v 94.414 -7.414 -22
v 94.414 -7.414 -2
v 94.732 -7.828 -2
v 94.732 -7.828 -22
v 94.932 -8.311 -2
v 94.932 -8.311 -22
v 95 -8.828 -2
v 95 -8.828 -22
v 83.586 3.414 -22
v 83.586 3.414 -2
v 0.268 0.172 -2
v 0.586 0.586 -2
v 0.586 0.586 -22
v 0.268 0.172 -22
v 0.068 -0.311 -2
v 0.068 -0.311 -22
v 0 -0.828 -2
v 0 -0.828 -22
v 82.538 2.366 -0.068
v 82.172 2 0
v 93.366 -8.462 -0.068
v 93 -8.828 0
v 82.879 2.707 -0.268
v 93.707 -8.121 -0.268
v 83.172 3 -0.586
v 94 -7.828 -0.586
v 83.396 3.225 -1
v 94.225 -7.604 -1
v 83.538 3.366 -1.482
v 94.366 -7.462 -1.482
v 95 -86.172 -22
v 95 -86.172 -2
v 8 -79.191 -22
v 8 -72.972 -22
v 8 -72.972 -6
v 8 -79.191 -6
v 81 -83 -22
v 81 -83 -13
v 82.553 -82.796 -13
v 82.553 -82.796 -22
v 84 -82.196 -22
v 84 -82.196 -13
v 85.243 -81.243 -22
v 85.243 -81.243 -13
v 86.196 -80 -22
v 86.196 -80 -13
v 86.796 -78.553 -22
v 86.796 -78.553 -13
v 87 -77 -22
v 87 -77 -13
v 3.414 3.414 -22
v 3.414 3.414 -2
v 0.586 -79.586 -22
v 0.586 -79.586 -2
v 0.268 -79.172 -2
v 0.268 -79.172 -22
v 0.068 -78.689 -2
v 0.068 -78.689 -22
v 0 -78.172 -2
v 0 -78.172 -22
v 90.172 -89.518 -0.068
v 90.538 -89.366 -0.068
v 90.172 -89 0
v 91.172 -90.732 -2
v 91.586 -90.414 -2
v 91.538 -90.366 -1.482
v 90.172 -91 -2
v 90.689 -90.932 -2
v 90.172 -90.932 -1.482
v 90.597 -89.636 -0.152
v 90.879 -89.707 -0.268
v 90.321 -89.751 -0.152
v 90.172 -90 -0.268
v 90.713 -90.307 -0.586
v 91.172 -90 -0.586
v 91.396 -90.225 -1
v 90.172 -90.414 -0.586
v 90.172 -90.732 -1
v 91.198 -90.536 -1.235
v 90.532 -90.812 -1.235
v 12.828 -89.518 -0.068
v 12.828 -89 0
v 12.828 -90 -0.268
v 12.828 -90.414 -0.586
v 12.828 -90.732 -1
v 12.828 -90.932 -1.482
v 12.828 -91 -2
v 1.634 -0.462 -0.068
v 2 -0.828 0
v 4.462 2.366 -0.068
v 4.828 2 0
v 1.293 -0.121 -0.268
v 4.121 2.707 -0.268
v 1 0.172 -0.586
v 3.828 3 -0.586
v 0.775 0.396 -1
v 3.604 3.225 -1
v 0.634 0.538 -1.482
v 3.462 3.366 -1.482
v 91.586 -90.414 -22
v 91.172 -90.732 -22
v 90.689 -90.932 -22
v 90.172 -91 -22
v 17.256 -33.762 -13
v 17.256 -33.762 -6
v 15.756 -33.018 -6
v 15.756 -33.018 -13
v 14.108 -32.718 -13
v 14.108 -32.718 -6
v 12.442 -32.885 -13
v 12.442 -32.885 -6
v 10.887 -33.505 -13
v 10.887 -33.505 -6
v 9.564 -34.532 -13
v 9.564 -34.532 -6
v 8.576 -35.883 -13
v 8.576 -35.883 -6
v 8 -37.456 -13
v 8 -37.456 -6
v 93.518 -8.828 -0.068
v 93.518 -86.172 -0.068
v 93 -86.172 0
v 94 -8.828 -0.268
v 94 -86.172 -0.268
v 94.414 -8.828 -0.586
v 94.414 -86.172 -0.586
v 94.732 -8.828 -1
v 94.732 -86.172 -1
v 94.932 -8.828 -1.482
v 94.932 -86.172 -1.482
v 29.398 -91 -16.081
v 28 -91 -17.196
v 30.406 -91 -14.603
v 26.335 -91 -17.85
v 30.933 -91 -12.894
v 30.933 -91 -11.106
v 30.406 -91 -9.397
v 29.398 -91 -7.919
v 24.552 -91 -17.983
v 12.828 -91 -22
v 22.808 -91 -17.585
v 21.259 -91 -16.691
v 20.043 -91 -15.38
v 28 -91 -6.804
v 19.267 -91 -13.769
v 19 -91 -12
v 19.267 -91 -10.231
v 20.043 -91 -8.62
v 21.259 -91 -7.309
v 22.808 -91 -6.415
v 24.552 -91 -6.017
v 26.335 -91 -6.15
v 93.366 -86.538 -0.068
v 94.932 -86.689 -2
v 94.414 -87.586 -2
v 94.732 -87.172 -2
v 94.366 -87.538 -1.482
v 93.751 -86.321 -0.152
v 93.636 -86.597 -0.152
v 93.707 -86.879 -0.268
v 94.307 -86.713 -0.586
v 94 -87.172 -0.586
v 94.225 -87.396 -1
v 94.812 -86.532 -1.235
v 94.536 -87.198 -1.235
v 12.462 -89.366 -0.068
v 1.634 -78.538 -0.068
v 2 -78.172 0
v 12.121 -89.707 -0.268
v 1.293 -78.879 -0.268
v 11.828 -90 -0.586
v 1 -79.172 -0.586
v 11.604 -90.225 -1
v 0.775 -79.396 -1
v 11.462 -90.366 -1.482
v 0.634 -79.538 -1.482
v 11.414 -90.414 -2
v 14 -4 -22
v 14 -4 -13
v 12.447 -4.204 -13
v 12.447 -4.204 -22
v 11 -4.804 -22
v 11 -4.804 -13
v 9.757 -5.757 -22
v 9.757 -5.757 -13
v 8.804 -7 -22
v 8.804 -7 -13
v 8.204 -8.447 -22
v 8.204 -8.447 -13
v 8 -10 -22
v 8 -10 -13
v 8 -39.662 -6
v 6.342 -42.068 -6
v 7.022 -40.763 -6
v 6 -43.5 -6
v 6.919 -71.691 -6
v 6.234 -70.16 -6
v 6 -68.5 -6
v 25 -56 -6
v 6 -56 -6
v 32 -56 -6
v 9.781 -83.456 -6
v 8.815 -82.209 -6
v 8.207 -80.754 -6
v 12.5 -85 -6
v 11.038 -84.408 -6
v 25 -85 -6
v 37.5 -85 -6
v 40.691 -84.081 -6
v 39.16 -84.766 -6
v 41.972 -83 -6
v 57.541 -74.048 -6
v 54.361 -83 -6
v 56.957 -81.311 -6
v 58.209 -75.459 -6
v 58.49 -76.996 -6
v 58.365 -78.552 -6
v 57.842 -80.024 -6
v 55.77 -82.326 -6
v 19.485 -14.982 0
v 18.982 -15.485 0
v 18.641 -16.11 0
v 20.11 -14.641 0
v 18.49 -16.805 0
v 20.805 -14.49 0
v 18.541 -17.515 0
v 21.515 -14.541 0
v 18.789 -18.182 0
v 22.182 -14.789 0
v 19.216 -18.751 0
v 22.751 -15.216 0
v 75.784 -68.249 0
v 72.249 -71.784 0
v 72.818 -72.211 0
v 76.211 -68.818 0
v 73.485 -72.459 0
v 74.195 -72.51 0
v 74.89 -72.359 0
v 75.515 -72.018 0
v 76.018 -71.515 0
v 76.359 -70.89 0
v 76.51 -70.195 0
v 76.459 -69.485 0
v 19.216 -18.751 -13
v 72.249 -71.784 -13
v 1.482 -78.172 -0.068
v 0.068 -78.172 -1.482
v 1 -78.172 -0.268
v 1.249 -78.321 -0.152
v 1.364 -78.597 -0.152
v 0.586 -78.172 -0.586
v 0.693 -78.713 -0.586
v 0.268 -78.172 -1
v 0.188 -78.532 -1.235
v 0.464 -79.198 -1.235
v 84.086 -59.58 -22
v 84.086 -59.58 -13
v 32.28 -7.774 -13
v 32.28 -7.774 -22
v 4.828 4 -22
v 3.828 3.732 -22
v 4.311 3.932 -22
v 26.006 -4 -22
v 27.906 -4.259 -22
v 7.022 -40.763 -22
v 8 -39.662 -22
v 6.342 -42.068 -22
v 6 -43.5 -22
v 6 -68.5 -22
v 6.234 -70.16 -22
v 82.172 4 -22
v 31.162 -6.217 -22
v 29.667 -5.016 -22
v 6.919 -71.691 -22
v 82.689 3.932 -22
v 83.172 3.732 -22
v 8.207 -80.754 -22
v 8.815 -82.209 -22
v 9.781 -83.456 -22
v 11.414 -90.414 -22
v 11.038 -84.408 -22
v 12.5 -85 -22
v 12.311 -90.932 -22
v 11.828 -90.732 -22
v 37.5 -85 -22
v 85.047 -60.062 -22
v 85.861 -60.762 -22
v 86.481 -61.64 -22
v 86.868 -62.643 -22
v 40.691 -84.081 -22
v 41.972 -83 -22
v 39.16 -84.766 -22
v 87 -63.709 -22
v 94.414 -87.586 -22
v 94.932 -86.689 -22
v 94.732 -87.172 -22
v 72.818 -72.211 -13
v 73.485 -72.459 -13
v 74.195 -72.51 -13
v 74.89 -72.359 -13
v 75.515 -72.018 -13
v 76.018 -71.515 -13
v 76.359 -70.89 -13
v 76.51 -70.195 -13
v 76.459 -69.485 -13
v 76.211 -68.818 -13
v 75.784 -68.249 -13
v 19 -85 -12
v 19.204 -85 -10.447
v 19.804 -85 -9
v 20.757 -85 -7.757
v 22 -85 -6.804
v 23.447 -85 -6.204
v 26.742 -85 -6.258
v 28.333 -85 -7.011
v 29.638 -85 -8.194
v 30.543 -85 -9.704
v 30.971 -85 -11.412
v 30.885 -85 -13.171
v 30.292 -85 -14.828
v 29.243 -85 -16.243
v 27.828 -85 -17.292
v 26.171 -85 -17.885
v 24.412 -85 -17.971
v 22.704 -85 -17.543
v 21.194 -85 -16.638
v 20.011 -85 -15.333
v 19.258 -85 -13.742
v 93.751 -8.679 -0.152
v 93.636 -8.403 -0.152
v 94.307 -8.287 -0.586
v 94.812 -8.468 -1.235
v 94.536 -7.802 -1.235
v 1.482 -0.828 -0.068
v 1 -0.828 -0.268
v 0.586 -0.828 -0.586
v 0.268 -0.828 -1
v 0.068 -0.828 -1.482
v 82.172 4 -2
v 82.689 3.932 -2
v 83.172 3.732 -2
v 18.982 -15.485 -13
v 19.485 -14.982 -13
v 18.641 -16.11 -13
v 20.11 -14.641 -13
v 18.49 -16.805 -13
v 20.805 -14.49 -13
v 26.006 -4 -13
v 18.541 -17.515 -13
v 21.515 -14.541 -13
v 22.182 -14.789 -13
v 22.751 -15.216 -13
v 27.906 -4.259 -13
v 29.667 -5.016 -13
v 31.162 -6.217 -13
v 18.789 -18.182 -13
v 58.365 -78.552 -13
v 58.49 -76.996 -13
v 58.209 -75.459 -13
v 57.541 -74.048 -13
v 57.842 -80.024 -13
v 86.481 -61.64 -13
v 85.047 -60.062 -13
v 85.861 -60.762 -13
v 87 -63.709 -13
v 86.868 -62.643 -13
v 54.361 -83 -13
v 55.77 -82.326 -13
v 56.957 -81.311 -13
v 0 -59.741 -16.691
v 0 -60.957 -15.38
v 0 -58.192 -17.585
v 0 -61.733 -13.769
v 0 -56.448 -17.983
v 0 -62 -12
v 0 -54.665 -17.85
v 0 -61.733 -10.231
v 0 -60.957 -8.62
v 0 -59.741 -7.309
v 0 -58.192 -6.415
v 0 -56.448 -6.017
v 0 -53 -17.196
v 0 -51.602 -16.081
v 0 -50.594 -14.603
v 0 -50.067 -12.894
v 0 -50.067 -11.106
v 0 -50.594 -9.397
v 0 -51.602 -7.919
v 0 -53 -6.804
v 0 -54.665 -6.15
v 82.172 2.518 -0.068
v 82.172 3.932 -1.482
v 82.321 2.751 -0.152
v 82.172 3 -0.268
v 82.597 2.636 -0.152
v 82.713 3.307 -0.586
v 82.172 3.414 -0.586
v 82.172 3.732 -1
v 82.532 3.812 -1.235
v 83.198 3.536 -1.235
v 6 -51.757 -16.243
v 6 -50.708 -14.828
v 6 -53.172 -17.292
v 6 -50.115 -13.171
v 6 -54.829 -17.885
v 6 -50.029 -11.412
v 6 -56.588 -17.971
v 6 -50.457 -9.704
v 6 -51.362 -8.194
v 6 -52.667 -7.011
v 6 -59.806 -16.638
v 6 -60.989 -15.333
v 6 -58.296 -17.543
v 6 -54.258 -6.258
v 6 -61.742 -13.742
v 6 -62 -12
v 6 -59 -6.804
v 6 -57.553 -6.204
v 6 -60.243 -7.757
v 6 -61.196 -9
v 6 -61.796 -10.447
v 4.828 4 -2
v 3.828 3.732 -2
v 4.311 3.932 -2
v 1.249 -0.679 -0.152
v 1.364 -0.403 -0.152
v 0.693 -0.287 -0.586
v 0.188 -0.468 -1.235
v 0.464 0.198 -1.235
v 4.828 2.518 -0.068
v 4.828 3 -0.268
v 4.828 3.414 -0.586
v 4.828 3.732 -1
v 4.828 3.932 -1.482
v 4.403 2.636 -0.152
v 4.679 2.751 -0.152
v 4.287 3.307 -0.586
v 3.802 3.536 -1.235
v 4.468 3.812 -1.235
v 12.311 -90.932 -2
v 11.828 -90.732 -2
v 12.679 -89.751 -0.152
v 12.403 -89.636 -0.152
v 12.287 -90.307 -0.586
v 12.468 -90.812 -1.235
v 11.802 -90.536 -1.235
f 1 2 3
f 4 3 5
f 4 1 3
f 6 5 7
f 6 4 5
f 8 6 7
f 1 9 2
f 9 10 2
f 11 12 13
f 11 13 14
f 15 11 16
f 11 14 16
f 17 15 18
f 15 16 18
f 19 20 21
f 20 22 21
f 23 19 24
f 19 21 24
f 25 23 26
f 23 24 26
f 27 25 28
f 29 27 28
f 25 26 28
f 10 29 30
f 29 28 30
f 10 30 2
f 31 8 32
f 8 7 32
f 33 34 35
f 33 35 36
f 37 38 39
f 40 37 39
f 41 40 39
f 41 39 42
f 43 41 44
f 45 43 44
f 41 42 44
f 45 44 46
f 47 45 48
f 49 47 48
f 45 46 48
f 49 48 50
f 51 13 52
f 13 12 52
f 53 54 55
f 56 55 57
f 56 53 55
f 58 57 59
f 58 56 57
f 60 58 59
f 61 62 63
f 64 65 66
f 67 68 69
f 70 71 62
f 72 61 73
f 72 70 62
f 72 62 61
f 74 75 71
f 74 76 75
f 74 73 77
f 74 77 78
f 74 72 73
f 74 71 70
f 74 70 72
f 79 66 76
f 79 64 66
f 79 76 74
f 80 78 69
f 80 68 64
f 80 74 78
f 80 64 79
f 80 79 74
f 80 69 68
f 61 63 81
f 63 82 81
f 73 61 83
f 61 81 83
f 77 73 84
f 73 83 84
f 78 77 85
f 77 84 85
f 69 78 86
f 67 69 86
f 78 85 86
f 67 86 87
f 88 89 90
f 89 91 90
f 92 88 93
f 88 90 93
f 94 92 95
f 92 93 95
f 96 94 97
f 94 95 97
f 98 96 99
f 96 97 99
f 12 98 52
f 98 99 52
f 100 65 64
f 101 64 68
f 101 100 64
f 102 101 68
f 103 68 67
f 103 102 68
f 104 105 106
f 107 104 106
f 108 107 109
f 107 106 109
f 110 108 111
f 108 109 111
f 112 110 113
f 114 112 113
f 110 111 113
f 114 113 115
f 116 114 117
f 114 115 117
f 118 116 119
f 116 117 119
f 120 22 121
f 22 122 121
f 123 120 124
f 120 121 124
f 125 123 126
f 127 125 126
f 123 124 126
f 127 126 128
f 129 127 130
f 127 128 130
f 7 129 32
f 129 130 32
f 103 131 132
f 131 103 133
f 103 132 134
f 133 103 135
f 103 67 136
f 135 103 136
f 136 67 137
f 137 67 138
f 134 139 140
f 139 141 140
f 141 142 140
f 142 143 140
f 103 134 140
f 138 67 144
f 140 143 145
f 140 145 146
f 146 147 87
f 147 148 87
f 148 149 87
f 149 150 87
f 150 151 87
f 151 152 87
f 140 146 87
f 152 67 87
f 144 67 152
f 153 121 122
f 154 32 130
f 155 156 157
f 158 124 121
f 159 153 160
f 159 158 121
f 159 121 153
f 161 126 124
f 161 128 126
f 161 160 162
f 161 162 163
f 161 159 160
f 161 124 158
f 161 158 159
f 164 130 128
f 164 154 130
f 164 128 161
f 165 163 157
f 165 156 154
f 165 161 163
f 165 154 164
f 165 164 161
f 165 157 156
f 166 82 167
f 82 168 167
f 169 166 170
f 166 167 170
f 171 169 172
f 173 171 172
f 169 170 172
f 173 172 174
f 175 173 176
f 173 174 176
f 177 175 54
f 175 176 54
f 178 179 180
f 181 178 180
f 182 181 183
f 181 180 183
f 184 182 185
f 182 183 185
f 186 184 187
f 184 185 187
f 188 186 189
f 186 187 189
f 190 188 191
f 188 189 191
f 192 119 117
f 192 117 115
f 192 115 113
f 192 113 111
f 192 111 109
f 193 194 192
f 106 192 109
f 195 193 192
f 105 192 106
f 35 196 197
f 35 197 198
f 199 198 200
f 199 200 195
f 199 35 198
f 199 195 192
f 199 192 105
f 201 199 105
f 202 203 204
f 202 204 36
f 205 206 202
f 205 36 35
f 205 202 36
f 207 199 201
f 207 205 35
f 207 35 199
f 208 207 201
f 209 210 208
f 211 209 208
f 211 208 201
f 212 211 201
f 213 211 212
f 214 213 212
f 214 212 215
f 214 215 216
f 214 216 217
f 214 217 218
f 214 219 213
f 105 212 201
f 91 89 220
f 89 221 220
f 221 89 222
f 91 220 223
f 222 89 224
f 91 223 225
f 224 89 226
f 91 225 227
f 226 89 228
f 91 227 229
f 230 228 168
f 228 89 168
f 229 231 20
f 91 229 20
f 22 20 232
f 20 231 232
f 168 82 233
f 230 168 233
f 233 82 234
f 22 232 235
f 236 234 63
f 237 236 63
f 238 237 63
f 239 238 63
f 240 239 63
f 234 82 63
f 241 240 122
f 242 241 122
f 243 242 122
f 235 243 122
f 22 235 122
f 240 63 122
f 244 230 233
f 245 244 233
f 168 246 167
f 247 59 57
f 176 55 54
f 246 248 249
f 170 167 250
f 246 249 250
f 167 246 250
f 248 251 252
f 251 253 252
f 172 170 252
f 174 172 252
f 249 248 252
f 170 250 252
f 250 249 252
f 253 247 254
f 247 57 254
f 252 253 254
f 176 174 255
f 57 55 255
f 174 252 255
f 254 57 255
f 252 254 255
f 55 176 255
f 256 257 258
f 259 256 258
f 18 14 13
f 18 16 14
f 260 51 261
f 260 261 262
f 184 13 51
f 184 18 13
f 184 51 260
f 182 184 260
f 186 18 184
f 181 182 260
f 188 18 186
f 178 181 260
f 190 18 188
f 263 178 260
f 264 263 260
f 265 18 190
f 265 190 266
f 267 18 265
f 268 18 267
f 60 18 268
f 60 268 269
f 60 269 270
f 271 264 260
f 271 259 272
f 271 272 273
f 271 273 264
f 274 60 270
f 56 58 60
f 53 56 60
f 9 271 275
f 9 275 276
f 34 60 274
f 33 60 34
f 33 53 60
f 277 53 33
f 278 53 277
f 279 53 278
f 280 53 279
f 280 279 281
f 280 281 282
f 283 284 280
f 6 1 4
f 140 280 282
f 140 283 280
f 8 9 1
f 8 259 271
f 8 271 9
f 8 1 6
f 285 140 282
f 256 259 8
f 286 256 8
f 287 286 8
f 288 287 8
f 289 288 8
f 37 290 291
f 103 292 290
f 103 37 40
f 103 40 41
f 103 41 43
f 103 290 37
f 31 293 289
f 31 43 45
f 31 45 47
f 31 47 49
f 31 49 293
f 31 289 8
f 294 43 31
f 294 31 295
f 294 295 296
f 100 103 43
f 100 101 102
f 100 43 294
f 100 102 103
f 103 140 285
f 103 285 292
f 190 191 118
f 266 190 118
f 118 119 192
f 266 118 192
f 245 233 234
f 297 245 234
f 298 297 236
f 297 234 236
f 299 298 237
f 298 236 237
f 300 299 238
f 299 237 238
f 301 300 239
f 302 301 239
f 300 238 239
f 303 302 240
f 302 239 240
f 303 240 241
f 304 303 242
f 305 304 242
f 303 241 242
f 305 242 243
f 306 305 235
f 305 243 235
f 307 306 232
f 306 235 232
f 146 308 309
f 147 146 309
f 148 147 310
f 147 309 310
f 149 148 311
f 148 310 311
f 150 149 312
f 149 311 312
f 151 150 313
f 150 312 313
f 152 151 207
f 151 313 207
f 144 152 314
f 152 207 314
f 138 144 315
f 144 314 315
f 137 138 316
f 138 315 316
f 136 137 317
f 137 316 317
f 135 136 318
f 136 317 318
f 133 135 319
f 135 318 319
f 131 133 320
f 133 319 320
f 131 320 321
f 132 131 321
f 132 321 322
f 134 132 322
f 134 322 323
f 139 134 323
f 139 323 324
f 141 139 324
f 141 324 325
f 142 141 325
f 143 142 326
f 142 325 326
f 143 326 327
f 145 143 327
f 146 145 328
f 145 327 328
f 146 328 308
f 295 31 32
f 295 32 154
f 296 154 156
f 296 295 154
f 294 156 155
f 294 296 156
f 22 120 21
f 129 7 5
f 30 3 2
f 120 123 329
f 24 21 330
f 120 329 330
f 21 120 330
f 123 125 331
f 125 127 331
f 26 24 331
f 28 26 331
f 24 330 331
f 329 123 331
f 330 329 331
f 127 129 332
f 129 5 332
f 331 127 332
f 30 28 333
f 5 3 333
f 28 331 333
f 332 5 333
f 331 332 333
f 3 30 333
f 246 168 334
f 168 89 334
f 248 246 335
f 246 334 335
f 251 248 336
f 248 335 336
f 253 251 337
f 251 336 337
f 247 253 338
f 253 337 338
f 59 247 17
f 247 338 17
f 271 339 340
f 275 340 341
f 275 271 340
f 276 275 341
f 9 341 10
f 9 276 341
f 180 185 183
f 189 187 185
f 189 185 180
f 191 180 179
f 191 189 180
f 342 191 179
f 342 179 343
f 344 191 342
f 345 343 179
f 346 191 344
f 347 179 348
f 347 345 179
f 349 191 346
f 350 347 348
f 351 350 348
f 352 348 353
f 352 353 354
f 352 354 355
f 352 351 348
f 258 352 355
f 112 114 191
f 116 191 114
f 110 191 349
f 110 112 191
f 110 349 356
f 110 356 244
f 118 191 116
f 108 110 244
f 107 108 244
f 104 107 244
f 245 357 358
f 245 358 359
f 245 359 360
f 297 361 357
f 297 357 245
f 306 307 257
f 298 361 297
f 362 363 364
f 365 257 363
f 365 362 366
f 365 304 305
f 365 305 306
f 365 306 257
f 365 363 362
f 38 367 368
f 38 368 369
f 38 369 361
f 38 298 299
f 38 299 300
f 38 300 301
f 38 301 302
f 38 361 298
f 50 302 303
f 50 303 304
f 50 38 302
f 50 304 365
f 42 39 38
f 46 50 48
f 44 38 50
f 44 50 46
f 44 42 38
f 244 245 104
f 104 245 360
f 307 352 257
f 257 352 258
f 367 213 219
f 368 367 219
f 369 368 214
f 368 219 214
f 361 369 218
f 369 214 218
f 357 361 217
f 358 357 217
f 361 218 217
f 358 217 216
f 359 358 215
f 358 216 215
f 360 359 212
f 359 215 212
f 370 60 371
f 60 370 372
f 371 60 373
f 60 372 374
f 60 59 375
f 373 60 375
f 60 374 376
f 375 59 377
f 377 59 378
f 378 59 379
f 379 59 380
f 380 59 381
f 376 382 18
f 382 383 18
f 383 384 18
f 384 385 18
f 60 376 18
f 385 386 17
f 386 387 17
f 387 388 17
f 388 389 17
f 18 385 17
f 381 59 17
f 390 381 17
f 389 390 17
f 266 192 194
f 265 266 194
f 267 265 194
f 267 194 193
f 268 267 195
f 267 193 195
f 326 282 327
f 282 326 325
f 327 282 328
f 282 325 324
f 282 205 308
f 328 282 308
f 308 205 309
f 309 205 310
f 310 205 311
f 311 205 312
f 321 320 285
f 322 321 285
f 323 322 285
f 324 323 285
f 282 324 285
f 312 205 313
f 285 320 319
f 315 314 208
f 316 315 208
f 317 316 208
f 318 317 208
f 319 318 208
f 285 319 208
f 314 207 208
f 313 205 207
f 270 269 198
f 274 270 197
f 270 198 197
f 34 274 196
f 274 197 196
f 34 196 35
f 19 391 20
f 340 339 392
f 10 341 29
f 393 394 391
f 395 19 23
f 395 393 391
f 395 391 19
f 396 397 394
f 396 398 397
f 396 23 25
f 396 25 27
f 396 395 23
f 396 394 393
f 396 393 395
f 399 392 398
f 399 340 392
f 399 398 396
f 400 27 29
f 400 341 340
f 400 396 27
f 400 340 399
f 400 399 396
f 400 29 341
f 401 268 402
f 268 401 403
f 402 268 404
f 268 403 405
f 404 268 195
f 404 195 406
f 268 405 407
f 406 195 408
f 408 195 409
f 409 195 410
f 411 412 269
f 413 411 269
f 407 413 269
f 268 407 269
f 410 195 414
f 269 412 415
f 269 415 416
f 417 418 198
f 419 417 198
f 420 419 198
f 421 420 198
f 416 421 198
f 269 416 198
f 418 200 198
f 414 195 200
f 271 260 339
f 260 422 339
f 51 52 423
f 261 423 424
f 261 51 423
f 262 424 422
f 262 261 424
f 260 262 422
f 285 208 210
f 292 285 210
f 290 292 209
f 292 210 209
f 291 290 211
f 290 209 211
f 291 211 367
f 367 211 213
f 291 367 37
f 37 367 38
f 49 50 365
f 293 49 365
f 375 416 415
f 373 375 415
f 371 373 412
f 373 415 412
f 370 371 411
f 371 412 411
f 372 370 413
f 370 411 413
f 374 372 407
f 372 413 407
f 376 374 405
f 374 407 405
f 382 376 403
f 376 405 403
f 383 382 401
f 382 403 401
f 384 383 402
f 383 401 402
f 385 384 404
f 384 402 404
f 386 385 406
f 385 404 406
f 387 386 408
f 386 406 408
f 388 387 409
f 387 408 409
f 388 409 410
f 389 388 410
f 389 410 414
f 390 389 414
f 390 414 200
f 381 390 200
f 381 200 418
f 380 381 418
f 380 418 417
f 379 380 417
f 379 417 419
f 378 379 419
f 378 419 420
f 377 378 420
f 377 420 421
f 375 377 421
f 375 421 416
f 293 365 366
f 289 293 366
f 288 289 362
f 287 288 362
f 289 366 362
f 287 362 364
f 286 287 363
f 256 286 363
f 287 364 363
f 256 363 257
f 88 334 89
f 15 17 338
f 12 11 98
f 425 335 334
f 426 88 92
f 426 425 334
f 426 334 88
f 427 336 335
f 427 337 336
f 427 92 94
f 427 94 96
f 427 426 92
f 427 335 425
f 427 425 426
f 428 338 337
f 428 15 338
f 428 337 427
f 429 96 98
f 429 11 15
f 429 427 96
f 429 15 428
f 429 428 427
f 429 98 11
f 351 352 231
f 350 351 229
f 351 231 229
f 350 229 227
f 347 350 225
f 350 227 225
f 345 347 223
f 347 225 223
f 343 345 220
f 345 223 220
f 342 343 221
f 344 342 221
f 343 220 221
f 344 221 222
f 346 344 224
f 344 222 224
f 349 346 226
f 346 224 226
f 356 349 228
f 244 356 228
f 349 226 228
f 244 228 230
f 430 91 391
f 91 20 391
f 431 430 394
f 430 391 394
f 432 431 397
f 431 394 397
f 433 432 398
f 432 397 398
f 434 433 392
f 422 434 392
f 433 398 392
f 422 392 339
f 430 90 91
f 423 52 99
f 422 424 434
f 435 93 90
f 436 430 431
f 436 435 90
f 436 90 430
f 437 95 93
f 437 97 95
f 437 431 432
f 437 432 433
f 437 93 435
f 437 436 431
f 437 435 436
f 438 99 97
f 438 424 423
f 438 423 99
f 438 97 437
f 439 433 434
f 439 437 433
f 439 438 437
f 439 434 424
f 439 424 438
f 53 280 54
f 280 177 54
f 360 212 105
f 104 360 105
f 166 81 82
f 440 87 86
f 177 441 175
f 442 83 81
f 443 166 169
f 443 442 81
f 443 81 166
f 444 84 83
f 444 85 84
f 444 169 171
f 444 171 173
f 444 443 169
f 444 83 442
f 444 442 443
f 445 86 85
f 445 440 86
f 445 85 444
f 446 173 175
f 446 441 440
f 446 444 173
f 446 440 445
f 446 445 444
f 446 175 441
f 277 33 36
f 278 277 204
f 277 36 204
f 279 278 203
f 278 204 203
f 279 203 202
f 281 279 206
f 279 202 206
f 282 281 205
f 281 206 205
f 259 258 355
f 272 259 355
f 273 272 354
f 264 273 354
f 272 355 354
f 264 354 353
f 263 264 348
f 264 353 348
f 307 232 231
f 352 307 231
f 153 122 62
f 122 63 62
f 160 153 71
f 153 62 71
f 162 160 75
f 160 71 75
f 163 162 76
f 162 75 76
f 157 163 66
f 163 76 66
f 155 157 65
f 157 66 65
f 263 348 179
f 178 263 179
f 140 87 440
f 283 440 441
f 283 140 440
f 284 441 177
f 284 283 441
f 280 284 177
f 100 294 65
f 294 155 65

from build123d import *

# Parameters (mm, degrees)
F1_DEPTH = 13
F2_DEPTH = 22
F3_DEPTH = 6
F4_R     = 2
F6_D     = 12
F6_DEPTH = 32
F6_TIP   = 3.6051637142
F7_ANGLE = 180
F9_D     = 12
F9_DEPTH = 35
F9_TIP   = 3.6051637142


with BuildPart() as f1:
    # F0 (on Top) → F1 (new body)
    with BuildSketch(Plane.XY):
        with BuildLine():
            ThreePointArc((26.0064161154, 8), (29.6673325286, 9.0163082132), (32.2804495808, 11.7743529264))
            Line((32.2804495808, 11.7743529264), (84.0861041215, 63.5800074671))
            ThreePointArc((84.0861041215, 63.5800074671), (86.1981822316, 65.1823937822), (87, 67.7093690715))
            Line((87, 67.7093690715), (87, 81))
            ThreePointArc((87, 81), (85.2426406871, 85.2426406871), (81, 87))
            Line((81, 87), (54.36097458, 87))
            ThreePointArc((54.36097458, 87), (58.1513332181, 83.3053678491), (57.5414087508, 78.0475054052))
            Line((57.5414087508, 78.0475054052), (17.2557162005, 37.7618128549))
            ThreePointArc((17.2557162005, 37.7618128549), (11.6428097519, 37.1404544076), (8, 41.455630213))
            Line((8, 41.455630213), (8, 14))
            ThreePointArc((8, 14), (9.7573593129, 9.7573593129), (14, 8))
            Line((14, 8), (26.0064161154, 8))
        make_face()
        with BuildLine():
            ThreePointArc((72.2487373415, 75.7842712475), (75.7842712475, 75.7842712475), (75.7842712475, 72.2487373415))
            Line((75.7842712475, 72.2487373415), (22.7512626585, 19.2157287525))
            ThreePointArc((22.7512626585, 19.2157287525), (19.2157287525, 19.2157287525), (19.2157287525, 22.7512626585))
            Line((19.2157287525, 22.7512626585), (72.2487373415, 75.7842712475))
        make_face(mode=Mode.SUBTRACT)
    extrude(amount=F1_DEPTH)

    # F0 (on Top) → F2 (join)
    with BuildSketch(Plane.XY):
        Polygon((0, 4), (4, 0), (83, 0), (95, 12), (95, 91), (91, 95), (12, 95), (0, 83), align=None)
        with BuildLine():
            Line((84.0861041215, 63.5800074671), (32.2804495808, 11.7743529264))
            ThreePointArc((32.2804495808, 11.7743529264), (29.6673325286, 9.0163082132), (26.0064161154, 8))
            Line((26.0064161154, 8), (14, 8))
            ThreePointArc((14, 8), (9.7573593129, 9.7573593129), (8, 14))
            Line((8, 14), (8, 41.455630213))
            Line((8, 41.455630213), (8, 43.6620265245))
            ThreePointArc((8, 43.6620265245), (6.6419072577, 45.3944081465), (6, 47.5))
            Line((6, 47.5), (6, 72.5))
            ThreePointArc((6, 72.5), (6.5227744249, 74.9494897428), (8, 76.972135955))
            Line((8, 76.972135955), (8, 83.1905249807))
            ThreePointArc((8, 83.1905249807), (9.2565835097, 86.8647595949), (12.5, 89))
            Line((12.5, 89), (37.5, 89))
            ThreePointArc((37.5, 89), (39.9494897428, 88.4772255751), (41.972135955, 87))
            Line((41.972135955, 87), (54.36097458, 87))
            Line((54.36097458, 87), (81, 87))
            ThreePointArc((81, 87), (85.2426406871, 85.2426406871), (87, 81))
            Line((87, 81), (87, 67.7093690715))
            ThreePointArc((87, 67.7093690715), (86.1981822316, 65.1823937822), (84.0861041215, 63.5800074671))
        make_face(mode=Mode.SUBTRACT)
    extrude(amount=F2_DEPTH)

    # F0 (on Top) → F3 (join)
    with BuildSketch(Plane.XY):
        with BuildLine():
            Line((8, 43.6620265245), (8, 41.455630213))
            ThreePointArc((8, 41.455630213), (11.6428097519, 37.1404544076), (17.2557162005, 37.7618128549))
            Line((17.2557162005, 37.7618128549), (57.5414087508, 78.0475054052))
            ThreePointArc((57.5414087508, 78.0475054052), (58.1513332181, 83.3053678491), (54.36097458, 87))
            Line((54.36097458, 87), (41.972135955, 87))
            ThreePointArc((41.972135955, 87), (39.9494897428, 88.4772255751), (37.5, 89))
            Line((37.5, 89), (12.5, 89))
            ThreePointArc((12.5, 89), (9.2565835097, 86.8647595949), (8, 83.1905249807))
            Line((8, 83.1905249807), (8, 76.972135955))
            ThreePointArc((8, 76.972135955), (6.5227744249, 74.9494897428), (6, 72.5))
            Line((6, 72.5), (6, 47.5))
            ThreePointArc((6, 47.5), (6.6419072577, 45.3944081465), (8, 43.6620265245))
        make_face()
    extrude(amount=F3_DEPTH)

    # F4
    f4_edges = [f1.edges().sort_by_distance(p)[0] for p in [
        (51.5, 95, 0),
        (91, 95, 11),
        (95, 91, 11),
        (95, 51.5, 0),
        (93, 93, 0),
        (89, 6, 0),
        (83, 0, 11),
        (95, 12, 11),
        (43.5, 0, 0),
        (4, 0, 11),
        (2, 2, 0),
        (0, 4, 11),
        (0, 43.5, 0),
        (6, 89, 0),
        (0, 83, 11),
        (12, 95, 11),
    ]]
    fillet(f4_edges, radius=F4_R)

    # F6
    with Locations(Plane(origin=(0, 0, 0), x_dir=(0, -1, 0), z_dir=(-1, 0, 0))):
        with Locations((-60, 12)):
            Hole(F6_D / 2, depth=F6_DEPTH)
            with Locations((0, 0, -(F6_DEPTH + F6_TIP / 2))):  # 118° drill point
                Cone(0, F6_D / 2, F6_TIP, mode=Mode.SUBTRACT)


with BuildPart() as f1_1:
    # F7: moved
    add(f1.part.rotate(Axis((43.5, 2, 0), (-1, 0, 0)), F7_ANGLE))

    # F9
    with Locations(Plane.XZ.offset(91)):
        with Locations((25, -12)):
            Hole(F9_D / 2, depth=F9_DEPTH)
            with Locations((0, 0, -(F9_DEPTH + F9_TIP / 2))):  # 118° drill point
                Cone(0, F9_D / 2, F9_TIP, mode=Mode.SUBTRACT)


solid = f1_1.part
